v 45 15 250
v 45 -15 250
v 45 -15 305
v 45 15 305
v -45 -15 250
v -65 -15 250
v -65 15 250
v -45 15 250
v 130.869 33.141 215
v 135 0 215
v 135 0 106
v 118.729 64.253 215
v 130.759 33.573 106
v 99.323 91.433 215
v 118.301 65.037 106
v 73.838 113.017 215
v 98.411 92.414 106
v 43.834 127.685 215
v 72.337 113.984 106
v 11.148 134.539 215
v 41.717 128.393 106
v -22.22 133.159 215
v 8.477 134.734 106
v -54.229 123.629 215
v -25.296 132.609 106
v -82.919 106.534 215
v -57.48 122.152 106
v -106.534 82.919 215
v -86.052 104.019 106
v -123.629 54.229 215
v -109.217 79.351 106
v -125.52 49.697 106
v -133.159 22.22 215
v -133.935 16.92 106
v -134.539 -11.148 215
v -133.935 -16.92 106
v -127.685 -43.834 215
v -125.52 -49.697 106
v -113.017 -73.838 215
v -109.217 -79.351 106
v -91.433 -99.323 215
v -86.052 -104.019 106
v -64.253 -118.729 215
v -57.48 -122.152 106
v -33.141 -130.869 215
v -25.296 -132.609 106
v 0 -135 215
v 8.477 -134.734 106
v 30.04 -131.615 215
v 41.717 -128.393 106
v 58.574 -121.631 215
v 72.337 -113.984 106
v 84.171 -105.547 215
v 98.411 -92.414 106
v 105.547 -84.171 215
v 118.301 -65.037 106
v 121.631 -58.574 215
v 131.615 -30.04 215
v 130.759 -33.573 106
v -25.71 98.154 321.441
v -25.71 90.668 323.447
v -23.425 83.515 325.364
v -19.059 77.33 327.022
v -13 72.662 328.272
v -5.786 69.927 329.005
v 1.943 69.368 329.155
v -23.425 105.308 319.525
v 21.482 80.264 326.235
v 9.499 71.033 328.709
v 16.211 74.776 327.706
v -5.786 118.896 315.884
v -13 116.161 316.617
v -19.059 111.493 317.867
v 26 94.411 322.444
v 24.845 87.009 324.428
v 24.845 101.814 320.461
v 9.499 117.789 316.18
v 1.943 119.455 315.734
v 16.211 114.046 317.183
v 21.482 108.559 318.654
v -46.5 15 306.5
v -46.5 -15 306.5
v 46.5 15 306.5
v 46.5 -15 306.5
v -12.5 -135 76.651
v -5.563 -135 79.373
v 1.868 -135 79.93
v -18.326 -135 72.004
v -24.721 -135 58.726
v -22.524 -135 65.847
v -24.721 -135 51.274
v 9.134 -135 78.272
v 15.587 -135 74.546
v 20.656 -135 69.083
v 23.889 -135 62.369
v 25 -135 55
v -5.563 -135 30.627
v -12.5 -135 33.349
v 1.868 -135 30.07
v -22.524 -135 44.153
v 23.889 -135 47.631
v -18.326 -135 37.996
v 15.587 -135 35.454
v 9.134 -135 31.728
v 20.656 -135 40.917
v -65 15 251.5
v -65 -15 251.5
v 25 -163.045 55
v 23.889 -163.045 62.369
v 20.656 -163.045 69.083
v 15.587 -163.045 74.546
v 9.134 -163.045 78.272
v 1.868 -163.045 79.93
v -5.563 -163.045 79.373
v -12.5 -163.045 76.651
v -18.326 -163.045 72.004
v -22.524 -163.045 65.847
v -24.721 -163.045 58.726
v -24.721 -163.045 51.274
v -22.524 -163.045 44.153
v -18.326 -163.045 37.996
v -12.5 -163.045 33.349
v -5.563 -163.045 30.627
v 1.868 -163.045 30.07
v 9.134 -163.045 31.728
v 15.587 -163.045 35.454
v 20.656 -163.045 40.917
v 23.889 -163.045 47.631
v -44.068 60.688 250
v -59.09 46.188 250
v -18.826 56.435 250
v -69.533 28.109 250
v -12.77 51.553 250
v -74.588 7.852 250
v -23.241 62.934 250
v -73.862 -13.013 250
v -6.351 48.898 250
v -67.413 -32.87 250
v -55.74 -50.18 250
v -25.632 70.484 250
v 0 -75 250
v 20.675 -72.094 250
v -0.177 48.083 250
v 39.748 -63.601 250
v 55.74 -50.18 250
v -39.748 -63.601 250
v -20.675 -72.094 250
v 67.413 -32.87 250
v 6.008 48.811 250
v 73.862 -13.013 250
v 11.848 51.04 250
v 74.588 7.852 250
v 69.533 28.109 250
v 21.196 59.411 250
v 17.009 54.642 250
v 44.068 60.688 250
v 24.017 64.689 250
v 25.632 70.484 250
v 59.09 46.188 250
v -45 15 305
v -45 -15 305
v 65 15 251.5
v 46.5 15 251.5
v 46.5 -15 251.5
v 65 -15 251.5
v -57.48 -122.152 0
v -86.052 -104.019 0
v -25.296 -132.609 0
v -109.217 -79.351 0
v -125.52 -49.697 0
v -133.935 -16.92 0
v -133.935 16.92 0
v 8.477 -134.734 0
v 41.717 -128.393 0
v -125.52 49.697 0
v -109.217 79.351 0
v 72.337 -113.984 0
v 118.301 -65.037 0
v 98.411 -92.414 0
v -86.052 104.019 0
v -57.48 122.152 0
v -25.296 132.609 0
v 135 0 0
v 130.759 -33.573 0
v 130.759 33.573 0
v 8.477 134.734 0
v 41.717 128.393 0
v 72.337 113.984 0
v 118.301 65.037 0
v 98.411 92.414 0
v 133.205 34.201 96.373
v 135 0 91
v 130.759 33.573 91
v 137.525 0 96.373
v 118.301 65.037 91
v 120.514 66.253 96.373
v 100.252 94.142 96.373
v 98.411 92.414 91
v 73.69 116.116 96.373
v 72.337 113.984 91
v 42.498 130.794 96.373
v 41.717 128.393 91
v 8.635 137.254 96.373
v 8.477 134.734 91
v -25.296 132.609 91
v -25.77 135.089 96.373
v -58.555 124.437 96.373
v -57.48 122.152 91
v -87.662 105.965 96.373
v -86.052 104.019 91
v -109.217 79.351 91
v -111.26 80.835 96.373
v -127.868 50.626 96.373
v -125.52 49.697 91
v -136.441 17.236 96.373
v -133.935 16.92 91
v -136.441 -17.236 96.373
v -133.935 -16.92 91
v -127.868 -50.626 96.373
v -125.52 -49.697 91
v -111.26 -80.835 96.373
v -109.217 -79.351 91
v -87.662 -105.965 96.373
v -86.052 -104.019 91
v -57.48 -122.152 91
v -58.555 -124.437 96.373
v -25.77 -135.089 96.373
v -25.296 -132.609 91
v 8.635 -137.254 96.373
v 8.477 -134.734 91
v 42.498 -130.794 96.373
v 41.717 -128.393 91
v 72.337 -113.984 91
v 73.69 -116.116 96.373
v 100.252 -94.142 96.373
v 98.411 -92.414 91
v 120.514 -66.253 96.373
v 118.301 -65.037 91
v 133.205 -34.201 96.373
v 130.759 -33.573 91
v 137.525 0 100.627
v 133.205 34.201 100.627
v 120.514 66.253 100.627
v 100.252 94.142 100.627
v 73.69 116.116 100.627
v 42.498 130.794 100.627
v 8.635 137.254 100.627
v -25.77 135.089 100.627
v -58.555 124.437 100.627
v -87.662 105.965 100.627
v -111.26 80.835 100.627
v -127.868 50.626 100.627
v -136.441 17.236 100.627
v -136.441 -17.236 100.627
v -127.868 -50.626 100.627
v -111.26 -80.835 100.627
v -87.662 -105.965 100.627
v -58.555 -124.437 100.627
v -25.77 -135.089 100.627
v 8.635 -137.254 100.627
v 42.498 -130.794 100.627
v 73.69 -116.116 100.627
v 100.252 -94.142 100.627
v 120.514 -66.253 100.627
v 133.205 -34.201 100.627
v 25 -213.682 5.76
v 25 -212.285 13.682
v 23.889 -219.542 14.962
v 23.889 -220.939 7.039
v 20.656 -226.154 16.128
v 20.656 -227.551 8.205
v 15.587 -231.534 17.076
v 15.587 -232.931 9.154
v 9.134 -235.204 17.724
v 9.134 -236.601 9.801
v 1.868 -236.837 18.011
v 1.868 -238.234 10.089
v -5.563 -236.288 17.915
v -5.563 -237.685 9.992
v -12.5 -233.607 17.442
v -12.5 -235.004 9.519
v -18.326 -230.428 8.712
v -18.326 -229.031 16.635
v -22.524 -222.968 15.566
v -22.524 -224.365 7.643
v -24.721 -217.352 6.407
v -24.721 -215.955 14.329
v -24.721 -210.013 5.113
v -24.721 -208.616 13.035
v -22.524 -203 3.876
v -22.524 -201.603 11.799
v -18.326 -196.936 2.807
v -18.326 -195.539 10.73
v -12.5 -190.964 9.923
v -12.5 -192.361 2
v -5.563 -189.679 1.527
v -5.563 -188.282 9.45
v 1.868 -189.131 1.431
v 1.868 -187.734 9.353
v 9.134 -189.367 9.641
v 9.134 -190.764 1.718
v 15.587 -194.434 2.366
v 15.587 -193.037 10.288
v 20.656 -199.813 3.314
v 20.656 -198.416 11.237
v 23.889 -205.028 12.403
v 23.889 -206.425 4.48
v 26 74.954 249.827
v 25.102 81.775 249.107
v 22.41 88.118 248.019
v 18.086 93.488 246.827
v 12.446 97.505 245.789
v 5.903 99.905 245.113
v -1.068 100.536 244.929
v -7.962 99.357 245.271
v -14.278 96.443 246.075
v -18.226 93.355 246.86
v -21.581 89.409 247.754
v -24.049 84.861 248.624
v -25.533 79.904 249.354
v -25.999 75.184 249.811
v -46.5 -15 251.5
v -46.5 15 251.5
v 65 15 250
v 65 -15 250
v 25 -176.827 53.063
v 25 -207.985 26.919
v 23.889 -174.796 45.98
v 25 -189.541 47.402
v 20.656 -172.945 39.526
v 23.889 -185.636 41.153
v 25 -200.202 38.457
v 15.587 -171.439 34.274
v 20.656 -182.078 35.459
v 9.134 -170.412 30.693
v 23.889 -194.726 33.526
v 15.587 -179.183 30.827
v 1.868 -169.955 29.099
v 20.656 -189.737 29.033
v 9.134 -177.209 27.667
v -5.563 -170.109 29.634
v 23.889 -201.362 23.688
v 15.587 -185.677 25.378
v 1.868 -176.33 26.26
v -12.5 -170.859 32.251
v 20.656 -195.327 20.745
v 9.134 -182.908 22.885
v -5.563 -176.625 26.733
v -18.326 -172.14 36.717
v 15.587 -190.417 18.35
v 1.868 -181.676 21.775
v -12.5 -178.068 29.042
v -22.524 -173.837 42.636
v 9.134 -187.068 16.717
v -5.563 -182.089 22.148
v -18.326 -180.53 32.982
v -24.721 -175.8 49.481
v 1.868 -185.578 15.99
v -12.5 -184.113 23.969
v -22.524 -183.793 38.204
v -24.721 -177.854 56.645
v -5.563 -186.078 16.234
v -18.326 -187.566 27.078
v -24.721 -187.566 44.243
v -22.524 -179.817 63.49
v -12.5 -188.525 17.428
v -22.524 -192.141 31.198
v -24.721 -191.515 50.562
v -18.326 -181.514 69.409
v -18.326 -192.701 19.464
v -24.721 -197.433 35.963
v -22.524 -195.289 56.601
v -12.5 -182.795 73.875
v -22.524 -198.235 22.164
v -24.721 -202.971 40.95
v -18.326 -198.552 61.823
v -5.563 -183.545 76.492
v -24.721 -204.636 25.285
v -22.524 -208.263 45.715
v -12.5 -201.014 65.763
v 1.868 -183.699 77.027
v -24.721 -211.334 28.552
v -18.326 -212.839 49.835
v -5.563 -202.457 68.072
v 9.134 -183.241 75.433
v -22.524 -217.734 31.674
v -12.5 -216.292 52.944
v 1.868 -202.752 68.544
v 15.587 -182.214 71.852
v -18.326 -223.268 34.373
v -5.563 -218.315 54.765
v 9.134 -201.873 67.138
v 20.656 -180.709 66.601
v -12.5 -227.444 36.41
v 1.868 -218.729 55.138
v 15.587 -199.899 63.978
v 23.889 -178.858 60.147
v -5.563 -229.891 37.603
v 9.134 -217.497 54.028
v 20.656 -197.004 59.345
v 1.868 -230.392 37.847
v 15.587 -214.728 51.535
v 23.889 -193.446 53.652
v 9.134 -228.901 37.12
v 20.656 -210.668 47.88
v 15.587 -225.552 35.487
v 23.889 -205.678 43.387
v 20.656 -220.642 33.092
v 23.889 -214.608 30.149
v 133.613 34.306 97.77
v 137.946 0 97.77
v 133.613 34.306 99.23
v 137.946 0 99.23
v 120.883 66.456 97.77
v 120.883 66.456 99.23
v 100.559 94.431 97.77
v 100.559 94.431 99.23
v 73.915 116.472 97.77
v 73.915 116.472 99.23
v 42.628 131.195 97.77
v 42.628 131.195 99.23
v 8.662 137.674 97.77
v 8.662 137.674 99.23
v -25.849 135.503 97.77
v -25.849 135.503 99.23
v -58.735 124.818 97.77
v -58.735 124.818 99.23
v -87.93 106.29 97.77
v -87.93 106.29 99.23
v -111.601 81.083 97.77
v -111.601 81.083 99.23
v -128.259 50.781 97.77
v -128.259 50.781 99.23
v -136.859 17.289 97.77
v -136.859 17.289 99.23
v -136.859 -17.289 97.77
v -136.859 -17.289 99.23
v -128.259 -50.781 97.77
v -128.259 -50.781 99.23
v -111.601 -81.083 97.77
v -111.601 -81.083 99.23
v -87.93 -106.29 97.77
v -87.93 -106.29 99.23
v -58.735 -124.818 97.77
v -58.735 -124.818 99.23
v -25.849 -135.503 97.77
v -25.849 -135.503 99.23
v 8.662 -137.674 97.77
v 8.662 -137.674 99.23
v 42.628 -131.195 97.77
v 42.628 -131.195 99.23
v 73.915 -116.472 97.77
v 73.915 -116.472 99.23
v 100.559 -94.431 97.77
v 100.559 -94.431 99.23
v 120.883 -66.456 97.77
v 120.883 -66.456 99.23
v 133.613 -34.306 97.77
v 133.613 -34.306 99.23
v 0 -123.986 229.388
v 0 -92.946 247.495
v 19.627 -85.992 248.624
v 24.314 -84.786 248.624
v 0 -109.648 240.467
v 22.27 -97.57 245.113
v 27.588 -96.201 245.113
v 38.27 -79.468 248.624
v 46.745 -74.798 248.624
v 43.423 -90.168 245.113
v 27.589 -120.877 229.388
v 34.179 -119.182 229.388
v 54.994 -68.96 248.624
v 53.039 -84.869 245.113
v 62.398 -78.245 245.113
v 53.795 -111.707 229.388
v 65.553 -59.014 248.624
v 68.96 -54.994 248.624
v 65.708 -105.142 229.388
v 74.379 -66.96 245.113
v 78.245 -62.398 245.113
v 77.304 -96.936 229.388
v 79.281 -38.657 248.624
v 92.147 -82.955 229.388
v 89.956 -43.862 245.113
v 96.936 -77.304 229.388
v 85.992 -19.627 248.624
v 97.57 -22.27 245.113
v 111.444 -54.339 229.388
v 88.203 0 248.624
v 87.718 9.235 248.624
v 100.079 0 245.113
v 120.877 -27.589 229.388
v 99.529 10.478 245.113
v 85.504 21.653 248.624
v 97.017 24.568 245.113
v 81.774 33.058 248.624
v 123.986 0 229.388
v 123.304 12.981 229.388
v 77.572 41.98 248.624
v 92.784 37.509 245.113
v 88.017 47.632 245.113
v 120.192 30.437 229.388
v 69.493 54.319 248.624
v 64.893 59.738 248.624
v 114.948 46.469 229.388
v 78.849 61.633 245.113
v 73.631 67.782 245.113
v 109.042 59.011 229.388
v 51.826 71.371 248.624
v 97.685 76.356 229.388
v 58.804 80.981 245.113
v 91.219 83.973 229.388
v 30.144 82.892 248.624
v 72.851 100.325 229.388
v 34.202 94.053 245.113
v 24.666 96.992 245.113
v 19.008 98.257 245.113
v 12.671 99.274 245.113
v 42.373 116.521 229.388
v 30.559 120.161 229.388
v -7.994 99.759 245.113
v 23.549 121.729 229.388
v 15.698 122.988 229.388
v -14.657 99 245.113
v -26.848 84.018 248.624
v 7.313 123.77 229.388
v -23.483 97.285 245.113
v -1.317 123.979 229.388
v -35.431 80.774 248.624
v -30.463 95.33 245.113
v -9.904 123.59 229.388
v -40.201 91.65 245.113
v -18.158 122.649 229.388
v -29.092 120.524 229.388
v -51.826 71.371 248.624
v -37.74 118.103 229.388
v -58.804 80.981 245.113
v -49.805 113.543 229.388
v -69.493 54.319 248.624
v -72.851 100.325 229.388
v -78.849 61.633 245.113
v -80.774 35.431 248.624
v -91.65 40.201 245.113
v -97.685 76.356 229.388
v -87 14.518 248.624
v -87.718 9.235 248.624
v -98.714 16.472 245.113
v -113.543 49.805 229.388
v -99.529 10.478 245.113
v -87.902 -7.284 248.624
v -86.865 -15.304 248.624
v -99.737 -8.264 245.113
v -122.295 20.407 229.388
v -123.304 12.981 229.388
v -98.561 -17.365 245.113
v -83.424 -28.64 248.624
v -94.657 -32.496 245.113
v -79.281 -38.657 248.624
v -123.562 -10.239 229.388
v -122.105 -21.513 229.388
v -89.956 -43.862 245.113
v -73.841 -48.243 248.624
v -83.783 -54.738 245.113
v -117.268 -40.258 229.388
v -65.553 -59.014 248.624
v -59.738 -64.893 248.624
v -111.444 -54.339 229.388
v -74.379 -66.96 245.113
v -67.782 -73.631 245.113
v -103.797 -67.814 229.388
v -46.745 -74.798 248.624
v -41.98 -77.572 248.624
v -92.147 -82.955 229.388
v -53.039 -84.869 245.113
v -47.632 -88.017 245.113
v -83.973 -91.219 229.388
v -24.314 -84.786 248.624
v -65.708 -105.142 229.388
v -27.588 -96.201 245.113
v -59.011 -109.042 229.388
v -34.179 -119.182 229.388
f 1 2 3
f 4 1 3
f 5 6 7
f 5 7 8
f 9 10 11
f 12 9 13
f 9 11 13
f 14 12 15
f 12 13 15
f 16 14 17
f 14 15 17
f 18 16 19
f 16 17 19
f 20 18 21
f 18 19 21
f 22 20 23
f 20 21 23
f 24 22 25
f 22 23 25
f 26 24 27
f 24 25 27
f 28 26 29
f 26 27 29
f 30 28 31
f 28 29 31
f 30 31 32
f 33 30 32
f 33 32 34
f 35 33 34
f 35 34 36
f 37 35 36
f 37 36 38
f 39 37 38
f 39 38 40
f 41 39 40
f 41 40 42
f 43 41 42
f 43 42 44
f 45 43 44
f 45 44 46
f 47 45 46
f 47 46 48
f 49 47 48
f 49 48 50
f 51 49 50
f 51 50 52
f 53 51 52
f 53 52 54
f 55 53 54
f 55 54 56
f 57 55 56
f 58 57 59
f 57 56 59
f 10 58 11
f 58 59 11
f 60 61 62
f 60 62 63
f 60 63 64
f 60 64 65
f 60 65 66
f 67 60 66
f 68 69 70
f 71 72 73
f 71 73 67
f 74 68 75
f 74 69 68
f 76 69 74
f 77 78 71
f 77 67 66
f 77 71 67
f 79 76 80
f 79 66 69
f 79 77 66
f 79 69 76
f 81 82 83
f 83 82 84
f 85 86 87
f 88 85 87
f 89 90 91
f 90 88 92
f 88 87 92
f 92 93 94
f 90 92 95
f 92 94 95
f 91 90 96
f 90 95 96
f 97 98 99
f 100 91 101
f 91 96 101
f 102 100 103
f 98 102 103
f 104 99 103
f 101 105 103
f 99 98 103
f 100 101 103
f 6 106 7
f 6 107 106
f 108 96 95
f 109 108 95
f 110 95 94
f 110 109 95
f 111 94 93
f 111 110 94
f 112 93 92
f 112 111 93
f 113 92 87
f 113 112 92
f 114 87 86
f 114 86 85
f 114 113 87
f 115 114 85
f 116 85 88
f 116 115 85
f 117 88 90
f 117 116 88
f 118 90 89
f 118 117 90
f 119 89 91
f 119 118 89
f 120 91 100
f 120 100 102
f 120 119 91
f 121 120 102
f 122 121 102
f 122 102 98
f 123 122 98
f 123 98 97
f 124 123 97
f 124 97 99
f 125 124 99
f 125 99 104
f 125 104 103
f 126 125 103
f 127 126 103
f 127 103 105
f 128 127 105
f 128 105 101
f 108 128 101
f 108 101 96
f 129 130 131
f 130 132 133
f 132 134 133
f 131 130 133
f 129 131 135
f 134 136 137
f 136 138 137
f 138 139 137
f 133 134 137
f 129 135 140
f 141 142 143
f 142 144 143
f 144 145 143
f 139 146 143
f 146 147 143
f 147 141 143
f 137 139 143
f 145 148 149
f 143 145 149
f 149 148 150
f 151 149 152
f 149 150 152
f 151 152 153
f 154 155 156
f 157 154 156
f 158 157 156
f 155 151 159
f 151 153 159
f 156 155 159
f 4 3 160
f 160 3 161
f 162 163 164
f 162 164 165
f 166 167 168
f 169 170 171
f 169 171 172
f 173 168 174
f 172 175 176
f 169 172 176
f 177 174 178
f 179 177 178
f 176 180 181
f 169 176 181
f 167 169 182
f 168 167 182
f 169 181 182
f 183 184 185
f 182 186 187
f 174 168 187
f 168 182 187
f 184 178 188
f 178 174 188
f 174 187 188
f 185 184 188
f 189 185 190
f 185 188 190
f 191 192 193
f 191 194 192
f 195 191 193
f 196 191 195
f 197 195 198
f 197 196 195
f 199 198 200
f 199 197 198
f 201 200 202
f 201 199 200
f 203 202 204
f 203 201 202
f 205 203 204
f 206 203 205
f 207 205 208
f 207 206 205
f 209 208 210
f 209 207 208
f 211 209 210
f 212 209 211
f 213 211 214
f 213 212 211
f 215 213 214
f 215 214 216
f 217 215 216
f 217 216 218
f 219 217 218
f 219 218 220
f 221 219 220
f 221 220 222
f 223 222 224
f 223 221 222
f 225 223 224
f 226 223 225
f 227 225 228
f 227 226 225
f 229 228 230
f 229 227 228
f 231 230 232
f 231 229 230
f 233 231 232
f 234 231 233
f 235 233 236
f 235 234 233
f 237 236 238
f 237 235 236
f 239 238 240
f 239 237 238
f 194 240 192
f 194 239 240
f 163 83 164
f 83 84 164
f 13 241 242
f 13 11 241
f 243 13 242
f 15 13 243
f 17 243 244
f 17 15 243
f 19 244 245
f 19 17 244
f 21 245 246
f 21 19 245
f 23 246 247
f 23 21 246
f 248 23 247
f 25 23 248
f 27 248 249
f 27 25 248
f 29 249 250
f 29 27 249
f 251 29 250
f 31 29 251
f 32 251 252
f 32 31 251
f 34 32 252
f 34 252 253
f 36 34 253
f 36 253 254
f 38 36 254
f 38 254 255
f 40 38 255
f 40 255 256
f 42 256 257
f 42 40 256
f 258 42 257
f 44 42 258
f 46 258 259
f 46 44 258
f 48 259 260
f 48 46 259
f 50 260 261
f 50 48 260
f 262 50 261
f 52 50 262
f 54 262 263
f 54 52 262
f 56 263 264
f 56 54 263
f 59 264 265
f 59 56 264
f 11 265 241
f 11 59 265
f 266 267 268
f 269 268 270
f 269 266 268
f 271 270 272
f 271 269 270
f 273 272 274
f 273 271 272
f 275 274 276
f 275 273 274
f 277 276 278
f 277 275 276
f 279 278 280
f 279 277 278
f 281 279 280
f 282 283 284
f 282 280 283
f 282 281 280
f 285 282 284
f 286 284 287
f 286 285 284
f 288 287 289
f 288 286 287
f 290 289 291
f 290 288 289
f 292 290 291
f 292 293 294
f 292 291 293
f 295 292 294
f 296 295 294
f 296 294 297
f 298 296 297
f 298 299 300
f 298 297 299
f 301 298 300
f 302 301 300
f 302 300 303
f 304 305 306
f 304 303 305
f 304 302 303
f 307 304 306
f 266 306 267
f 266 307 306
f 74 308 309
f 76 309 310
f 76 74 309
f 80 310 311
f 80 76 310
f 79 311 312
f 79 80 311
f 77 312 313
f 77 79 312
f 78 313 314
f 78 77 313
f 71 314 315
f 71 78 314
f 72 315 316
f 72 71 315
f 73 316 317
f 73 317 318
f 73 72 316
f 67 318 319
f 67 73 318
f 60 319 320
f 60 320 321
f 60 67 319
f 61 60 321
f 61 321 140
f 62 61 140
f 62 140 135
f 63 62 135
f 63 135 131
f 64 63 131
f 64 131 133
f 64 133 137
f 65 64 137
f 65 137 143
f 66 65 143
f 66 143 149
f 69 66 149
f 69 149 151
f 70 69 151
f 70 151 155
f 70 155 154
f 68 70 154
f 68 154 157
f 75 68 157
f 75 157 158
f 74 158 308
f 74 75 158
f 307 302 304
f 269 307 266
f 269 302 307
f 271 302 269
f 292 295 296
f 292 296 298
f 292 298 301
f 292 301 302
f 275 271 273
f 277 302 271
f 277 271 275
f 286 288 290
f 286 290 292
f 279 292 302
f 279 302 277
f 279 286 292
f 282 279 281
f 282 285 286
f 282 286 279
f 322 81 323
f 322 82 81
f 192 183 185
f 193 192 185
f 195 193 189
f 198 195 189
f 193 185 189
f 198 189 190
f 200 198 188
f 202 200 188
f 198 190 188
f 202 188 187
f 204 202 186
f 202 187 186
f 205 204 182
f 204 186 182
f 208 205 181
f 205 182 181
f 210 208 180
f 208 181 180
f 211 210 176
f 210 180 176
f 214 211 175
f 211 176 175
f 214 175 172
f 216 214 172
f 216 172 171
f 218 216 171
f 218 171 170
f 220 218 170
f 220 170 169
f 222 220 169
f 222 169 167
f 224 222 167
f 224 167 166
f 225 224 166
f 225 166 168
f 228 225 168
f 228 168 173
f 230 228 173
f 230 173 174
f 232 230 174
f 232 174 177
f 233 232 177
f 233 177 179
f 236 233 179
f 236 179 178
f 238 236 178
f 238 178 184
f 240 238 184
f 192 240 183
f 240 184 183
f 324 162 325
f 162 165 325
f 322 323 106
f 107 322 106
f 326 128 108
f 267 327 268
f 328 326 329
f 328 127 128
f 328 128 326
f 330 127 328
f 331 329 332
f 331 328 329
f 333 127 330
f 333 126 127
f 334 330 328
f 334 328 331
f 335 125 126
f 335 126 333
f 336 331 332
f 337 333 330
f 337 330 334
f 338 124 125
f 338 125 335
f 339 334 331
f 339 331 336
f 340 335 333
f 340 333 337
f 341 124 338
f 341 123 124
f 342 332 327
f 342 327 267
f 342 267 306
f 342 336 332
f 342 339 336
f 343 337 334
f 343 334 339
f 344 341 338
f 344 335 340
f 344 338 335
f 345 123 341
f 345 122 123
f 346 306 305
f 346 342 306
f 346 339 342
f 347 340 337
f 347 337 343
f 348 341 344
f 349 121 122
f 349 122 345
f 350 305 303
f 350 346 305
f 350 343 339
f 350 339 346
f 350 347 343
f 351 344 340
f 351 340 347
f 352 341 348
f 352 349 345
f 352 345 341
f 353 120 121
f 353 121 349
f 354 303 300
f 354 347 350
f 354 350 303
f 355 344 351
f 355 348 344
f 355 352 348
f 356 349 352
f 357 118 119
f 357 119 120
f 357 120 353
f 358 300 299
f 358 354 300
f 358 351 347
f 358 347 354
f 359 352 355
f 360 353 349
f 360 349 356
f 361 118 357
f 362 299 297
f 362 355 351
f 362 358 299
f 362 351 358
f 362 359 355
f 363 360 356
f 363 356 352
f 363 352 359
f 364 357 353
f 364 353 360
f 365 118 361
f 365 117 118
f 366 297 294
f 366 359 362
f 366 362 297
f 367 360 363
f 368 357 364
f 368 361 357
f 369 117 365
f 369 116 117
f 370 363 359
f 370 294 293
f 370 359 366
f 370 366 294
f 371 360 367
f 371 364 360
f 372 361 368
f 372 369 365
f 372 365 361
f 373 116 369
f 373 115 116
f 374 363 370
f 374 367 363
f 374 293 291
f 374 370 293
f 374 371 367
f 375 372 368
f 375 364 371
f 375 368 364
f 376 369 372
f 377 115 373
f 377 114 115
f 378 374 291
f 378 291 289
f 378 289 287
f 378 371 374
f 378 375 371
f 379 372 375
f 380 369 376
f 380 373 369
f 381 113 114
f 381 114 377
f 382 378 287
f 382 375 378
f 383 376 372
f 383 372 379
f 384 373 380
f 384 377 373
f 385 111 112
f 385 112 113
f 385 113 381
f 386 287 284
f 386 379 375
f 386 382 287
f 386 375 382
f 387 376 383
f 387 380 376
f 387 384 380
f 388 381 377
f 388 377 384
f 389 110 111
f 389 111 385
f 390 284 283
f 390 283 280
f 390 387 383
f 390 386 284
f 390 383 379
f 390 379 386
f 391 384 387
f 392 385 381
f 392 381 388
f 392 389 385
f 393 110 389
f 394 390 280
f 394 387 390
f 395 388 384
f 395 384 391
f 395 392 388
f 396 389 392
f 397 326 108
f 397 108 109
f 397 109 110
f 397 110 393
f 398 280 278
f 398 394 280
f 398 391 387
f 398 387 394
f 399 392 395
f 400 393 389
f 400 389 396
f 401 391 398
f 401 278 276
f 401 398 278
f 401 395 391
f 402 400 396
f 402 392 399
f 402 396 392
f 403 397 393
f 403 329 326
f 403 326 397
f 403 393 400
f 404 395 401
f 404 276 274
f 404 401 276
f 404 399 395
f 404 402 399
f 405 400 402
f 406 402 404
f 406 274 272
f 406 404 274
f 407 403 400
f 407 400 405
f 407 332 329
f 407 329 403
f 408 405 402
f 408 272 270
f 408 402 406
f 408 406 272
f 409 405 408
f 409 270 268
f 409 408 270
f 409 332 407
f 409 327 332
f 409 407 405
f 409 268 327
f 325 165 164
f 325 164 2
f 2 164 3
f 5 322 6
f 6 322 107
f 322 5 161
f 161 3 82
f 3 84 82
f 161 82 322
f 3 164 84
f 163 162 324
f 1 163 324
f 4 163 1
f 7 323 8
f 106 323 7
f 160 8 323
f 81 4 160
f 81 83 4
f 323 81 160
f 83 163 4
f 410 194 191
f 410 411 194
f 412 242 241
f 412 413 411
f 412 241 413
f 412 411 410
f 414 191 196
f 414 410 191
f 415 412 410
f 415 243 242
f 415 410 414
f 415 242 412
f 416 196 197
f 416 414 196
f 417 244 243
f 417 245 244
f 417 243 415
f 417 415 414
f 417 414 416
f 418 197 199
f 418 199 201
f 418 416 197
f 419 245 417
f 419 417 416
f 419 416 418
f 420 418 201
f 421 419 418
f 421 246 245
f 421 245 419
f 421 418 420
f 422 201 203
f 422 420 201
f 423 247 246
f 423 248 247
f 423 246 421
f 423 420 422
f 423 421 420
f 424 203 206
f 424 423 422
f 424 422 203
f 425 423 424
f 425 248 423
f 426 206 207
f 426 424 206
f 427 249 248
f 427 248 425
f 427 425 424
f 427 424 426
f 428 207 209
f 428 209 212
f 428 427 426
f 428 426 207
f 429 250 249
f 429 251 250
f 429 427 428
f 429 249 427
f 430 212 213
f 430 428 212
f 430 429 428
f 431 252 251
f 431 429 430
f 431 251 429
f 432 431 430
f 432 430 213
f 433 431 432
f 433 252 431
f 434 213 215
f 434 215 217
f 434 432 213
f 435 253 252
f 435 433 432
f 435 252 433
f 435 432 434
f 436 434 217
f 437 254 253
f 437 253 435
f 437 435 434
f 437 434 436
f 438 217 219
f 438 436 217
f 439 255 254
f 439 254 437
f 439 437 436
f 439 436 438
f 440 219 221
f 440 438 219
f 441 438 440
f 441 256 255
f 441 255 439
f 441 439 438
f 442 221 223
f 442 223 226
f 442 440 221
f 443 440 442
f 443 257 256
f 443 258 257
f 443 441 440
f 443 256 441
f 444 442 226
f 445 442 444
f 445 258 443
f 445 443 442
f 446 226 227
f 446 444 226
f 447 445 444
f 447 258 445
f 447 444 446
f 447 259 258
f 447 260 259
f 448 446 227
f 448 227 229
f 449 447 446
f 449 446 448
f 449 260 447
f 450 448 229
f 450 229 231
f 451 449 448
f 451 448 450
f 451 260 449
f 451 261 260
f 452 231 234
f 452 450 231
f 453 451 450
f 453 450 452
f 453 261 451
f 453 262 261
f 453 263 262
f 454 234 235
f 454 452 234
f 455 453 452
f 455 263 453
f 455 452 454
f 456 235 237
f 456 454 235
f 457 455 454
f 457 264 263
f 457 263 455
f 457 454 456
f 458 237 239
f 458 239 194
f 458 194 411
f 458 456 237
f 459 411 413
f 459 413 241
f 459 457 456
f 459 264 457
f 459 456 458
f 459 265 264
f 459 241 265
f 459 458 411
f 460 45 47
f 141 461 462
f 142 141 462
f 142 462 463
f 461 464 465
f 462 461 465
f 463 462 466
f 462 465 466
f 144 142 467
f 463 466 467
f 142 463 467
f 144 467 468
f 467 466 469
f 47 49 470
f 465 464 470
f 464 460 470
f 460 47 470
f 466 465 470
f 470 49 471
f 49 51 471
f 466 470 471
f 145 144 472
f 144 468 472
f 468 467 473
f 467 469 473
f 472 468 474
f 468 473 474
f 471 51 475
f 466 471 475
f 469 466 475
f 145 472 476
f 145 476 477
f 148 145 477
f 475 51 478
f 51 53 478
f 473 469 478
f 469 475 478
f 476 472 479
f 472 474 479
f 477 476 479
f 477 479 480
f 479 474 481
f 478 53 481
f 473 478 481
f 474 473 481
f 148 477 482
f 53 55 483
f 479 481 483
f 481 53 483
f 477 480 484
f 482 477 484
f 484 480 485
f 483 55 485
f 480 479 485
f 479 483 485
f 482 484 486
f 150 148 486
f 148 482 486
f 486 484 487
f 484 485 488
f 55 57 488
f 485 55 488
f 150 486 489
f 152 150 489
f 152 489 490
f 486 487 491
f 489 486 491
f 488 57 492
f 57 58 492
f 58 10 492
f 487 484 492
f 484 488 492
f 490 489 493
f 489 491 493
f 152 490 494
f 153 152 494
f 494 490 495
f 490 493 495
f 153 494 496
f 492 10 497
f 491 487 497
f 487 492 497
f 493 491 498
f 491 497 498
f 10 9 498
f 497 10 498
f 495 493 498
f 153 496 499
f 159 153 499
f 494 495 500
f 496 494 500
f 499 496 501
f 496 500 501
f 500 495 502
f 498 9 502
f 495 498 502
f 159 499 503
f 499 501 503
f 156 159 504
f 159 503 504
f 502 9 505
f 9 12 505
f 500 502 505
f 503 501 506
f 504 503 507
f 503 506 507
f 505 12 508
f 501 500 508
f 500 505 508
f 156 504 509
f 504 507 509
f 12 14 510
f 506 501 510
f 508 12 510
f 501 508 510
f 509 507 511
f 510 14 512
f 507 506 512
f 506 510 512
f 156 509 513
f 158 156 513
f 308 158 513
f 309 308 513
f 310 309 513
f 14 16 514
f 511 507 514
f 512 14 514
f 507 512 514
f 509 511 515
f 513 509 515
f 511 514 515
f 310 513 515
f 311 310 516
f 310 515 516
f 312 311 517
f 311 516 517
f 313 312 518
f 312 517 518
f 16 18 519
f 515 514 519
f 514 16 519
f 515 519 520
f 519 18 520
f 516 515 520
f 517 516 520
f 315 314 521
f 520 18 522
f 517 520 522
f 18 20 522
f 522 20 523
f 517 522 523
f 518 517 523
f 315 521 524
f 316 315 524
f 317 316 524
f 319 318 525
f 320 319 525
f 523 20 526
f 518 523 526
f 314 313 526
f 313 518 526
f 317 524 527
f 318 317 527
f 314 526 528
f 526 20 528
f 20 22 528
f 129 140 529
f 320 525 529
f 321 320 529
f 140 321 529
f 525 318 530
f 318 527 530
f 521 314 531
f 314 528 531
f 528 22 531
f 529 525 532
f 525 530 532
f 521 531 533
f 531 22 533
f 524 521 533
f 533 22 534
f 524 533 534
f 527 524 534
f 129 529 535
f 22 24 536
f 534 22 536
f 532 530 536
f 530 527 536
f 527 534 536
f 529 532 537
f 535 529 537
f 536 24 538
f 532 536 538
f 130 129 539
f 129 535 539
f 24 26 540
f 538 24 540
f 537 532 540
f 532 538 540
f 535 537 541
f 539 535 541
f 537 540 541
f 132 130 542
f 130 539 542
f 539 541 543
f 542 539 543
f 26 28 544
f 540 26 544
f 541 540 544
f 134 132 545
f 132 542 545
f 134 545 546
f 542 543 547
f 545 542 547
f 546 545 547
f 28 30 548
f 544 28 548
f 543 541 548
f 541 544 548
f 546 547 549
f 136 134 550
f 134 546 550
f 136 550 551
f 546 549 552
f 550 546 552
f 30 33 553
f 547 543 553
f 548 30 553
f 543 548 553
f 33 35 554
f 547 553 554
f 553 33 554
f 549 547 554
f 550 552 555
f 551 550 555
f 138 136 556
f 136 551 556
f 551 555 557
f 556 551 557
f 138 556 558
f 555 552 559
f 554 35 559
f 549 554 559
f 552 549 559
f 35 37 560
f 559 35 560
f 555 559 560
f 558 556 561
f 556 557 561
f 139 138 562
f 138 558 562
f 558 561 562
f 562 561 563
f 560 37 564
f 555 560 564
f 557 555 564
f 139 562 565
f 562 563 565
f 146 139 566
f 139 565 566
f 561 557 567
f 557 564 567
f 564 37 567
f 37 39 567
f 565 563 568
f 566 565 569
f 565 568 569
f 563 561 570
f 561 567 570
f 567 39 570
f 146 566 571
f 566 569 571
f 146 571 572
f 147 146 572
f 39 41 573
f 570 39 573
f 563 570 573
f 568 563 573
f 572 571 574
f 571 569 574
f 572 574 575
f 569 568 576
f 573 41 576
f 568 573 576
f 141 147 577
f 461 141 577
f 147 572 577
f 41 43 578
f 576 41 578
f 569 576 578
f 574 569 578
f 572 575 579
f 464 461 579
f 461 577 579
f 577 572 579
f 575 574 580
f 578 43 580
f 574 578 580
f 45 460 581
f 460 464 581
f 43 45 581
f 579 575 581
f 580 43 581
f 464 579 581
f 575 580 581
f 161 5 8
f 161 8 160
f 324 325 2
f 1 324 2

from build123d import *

# Parameters (mm, degrees)
F0_R      = 135
F1_DEPTH  = 215
F5_DEPTH  = 15
F10_R     = 26
F11_DEPTH = 75
F13_R     = 25


with BuildPart() as f1:
    # F0 (on Top) → F1 (new body)
    with BuildSketch(Plane.XY):
        Circle(F0_R)
    extrude(amount=F1_DEPTH)

    # F2 (on Right) → F3 (revolve)
    with BuildSketch(Plane.YZ):
        with BuildLine():
            ThreePointArc((-75, 250), (-109.6475910005, 240.467298858), (-135, 215))
            Line((-135, 215), (0, 215))
            Line((0, 215), (0, 250))
            Line((0, 250), (-75, 250))
        make_face()
    revolve(axis=Axis((0, 0, 232.5), (0, 0, 1)))

    # F10 (on face) → F11 (join, symmetric)
    with BuildSketch(Plane(origin=(0, 67.5240473581, 252.0031754731), x_dir=(1, 0, 0), z_dir=(0, 0.2588190451, 0.9659258263))):
        with Locations((0, 7.739675696)):
            Circle(F10_R)
    extrude(amount=F11_DEPTH, both=True)

    # F16 (on Front) → F17 (revolve)
    with BuildSketch(Plane.XZ):
        with BuildLine():
            Line((137.5252101931, 100.6266106152), (135, 106))
            Line((135, 106), (135, 91))
            Line((135, 91), (137.5252101931, 96.3733893848))
            ThreePointArc((137.5252101931, 96.3733893848), (138, 98.5), (137.5252101931, 100.6266106152))
        make_face()
    revolve(axis=Axis((0, 0, 0), (0, 0, 1)))


with BuildPart() as f5:
    # F4 (on Front) → F5 (new body, symmetric)
    with BuildSketch(Plane.XZ):
        Polygon((-65, 251.5), (-65, 250), (-45, 250), (-45, 305), (0, 305), (0, 306.5), (-46.5, 306.5), (-46.5, 251.5), align=None)
    extrude(amount=F5_DEPTH, both=True)

    # F6: F5 across plane


with BuildPart() as f5_1:
    add(f5.part)
    add(f5.part.mirror(Plane.YZ))


with BuildPart() as f15:
    # F15: sweep along a path in F14
    with BuildLine(Plane.YZ) as f15_path:
        Line((-135, 55), (-163.0450184411, 55))
        ThreePointArc((-163.0450184411, 55), (-195.1843989255, 43.3022221559), (-212.2854060917, 13.6824088833))
        Line((-212.2854060917, 13.6824088833), (-213.6824088833, 5.7596123494))
    # F13 (on offset) → F15 (sweep)
    with BuildSketch(Plane.XZ.offset(135)):
        with Locations((0, 55)):
            Circle(F13_R)
    sweep(path=f15_path.line)


solid = Compound([f1.part, f5_1.part, f15.part])
